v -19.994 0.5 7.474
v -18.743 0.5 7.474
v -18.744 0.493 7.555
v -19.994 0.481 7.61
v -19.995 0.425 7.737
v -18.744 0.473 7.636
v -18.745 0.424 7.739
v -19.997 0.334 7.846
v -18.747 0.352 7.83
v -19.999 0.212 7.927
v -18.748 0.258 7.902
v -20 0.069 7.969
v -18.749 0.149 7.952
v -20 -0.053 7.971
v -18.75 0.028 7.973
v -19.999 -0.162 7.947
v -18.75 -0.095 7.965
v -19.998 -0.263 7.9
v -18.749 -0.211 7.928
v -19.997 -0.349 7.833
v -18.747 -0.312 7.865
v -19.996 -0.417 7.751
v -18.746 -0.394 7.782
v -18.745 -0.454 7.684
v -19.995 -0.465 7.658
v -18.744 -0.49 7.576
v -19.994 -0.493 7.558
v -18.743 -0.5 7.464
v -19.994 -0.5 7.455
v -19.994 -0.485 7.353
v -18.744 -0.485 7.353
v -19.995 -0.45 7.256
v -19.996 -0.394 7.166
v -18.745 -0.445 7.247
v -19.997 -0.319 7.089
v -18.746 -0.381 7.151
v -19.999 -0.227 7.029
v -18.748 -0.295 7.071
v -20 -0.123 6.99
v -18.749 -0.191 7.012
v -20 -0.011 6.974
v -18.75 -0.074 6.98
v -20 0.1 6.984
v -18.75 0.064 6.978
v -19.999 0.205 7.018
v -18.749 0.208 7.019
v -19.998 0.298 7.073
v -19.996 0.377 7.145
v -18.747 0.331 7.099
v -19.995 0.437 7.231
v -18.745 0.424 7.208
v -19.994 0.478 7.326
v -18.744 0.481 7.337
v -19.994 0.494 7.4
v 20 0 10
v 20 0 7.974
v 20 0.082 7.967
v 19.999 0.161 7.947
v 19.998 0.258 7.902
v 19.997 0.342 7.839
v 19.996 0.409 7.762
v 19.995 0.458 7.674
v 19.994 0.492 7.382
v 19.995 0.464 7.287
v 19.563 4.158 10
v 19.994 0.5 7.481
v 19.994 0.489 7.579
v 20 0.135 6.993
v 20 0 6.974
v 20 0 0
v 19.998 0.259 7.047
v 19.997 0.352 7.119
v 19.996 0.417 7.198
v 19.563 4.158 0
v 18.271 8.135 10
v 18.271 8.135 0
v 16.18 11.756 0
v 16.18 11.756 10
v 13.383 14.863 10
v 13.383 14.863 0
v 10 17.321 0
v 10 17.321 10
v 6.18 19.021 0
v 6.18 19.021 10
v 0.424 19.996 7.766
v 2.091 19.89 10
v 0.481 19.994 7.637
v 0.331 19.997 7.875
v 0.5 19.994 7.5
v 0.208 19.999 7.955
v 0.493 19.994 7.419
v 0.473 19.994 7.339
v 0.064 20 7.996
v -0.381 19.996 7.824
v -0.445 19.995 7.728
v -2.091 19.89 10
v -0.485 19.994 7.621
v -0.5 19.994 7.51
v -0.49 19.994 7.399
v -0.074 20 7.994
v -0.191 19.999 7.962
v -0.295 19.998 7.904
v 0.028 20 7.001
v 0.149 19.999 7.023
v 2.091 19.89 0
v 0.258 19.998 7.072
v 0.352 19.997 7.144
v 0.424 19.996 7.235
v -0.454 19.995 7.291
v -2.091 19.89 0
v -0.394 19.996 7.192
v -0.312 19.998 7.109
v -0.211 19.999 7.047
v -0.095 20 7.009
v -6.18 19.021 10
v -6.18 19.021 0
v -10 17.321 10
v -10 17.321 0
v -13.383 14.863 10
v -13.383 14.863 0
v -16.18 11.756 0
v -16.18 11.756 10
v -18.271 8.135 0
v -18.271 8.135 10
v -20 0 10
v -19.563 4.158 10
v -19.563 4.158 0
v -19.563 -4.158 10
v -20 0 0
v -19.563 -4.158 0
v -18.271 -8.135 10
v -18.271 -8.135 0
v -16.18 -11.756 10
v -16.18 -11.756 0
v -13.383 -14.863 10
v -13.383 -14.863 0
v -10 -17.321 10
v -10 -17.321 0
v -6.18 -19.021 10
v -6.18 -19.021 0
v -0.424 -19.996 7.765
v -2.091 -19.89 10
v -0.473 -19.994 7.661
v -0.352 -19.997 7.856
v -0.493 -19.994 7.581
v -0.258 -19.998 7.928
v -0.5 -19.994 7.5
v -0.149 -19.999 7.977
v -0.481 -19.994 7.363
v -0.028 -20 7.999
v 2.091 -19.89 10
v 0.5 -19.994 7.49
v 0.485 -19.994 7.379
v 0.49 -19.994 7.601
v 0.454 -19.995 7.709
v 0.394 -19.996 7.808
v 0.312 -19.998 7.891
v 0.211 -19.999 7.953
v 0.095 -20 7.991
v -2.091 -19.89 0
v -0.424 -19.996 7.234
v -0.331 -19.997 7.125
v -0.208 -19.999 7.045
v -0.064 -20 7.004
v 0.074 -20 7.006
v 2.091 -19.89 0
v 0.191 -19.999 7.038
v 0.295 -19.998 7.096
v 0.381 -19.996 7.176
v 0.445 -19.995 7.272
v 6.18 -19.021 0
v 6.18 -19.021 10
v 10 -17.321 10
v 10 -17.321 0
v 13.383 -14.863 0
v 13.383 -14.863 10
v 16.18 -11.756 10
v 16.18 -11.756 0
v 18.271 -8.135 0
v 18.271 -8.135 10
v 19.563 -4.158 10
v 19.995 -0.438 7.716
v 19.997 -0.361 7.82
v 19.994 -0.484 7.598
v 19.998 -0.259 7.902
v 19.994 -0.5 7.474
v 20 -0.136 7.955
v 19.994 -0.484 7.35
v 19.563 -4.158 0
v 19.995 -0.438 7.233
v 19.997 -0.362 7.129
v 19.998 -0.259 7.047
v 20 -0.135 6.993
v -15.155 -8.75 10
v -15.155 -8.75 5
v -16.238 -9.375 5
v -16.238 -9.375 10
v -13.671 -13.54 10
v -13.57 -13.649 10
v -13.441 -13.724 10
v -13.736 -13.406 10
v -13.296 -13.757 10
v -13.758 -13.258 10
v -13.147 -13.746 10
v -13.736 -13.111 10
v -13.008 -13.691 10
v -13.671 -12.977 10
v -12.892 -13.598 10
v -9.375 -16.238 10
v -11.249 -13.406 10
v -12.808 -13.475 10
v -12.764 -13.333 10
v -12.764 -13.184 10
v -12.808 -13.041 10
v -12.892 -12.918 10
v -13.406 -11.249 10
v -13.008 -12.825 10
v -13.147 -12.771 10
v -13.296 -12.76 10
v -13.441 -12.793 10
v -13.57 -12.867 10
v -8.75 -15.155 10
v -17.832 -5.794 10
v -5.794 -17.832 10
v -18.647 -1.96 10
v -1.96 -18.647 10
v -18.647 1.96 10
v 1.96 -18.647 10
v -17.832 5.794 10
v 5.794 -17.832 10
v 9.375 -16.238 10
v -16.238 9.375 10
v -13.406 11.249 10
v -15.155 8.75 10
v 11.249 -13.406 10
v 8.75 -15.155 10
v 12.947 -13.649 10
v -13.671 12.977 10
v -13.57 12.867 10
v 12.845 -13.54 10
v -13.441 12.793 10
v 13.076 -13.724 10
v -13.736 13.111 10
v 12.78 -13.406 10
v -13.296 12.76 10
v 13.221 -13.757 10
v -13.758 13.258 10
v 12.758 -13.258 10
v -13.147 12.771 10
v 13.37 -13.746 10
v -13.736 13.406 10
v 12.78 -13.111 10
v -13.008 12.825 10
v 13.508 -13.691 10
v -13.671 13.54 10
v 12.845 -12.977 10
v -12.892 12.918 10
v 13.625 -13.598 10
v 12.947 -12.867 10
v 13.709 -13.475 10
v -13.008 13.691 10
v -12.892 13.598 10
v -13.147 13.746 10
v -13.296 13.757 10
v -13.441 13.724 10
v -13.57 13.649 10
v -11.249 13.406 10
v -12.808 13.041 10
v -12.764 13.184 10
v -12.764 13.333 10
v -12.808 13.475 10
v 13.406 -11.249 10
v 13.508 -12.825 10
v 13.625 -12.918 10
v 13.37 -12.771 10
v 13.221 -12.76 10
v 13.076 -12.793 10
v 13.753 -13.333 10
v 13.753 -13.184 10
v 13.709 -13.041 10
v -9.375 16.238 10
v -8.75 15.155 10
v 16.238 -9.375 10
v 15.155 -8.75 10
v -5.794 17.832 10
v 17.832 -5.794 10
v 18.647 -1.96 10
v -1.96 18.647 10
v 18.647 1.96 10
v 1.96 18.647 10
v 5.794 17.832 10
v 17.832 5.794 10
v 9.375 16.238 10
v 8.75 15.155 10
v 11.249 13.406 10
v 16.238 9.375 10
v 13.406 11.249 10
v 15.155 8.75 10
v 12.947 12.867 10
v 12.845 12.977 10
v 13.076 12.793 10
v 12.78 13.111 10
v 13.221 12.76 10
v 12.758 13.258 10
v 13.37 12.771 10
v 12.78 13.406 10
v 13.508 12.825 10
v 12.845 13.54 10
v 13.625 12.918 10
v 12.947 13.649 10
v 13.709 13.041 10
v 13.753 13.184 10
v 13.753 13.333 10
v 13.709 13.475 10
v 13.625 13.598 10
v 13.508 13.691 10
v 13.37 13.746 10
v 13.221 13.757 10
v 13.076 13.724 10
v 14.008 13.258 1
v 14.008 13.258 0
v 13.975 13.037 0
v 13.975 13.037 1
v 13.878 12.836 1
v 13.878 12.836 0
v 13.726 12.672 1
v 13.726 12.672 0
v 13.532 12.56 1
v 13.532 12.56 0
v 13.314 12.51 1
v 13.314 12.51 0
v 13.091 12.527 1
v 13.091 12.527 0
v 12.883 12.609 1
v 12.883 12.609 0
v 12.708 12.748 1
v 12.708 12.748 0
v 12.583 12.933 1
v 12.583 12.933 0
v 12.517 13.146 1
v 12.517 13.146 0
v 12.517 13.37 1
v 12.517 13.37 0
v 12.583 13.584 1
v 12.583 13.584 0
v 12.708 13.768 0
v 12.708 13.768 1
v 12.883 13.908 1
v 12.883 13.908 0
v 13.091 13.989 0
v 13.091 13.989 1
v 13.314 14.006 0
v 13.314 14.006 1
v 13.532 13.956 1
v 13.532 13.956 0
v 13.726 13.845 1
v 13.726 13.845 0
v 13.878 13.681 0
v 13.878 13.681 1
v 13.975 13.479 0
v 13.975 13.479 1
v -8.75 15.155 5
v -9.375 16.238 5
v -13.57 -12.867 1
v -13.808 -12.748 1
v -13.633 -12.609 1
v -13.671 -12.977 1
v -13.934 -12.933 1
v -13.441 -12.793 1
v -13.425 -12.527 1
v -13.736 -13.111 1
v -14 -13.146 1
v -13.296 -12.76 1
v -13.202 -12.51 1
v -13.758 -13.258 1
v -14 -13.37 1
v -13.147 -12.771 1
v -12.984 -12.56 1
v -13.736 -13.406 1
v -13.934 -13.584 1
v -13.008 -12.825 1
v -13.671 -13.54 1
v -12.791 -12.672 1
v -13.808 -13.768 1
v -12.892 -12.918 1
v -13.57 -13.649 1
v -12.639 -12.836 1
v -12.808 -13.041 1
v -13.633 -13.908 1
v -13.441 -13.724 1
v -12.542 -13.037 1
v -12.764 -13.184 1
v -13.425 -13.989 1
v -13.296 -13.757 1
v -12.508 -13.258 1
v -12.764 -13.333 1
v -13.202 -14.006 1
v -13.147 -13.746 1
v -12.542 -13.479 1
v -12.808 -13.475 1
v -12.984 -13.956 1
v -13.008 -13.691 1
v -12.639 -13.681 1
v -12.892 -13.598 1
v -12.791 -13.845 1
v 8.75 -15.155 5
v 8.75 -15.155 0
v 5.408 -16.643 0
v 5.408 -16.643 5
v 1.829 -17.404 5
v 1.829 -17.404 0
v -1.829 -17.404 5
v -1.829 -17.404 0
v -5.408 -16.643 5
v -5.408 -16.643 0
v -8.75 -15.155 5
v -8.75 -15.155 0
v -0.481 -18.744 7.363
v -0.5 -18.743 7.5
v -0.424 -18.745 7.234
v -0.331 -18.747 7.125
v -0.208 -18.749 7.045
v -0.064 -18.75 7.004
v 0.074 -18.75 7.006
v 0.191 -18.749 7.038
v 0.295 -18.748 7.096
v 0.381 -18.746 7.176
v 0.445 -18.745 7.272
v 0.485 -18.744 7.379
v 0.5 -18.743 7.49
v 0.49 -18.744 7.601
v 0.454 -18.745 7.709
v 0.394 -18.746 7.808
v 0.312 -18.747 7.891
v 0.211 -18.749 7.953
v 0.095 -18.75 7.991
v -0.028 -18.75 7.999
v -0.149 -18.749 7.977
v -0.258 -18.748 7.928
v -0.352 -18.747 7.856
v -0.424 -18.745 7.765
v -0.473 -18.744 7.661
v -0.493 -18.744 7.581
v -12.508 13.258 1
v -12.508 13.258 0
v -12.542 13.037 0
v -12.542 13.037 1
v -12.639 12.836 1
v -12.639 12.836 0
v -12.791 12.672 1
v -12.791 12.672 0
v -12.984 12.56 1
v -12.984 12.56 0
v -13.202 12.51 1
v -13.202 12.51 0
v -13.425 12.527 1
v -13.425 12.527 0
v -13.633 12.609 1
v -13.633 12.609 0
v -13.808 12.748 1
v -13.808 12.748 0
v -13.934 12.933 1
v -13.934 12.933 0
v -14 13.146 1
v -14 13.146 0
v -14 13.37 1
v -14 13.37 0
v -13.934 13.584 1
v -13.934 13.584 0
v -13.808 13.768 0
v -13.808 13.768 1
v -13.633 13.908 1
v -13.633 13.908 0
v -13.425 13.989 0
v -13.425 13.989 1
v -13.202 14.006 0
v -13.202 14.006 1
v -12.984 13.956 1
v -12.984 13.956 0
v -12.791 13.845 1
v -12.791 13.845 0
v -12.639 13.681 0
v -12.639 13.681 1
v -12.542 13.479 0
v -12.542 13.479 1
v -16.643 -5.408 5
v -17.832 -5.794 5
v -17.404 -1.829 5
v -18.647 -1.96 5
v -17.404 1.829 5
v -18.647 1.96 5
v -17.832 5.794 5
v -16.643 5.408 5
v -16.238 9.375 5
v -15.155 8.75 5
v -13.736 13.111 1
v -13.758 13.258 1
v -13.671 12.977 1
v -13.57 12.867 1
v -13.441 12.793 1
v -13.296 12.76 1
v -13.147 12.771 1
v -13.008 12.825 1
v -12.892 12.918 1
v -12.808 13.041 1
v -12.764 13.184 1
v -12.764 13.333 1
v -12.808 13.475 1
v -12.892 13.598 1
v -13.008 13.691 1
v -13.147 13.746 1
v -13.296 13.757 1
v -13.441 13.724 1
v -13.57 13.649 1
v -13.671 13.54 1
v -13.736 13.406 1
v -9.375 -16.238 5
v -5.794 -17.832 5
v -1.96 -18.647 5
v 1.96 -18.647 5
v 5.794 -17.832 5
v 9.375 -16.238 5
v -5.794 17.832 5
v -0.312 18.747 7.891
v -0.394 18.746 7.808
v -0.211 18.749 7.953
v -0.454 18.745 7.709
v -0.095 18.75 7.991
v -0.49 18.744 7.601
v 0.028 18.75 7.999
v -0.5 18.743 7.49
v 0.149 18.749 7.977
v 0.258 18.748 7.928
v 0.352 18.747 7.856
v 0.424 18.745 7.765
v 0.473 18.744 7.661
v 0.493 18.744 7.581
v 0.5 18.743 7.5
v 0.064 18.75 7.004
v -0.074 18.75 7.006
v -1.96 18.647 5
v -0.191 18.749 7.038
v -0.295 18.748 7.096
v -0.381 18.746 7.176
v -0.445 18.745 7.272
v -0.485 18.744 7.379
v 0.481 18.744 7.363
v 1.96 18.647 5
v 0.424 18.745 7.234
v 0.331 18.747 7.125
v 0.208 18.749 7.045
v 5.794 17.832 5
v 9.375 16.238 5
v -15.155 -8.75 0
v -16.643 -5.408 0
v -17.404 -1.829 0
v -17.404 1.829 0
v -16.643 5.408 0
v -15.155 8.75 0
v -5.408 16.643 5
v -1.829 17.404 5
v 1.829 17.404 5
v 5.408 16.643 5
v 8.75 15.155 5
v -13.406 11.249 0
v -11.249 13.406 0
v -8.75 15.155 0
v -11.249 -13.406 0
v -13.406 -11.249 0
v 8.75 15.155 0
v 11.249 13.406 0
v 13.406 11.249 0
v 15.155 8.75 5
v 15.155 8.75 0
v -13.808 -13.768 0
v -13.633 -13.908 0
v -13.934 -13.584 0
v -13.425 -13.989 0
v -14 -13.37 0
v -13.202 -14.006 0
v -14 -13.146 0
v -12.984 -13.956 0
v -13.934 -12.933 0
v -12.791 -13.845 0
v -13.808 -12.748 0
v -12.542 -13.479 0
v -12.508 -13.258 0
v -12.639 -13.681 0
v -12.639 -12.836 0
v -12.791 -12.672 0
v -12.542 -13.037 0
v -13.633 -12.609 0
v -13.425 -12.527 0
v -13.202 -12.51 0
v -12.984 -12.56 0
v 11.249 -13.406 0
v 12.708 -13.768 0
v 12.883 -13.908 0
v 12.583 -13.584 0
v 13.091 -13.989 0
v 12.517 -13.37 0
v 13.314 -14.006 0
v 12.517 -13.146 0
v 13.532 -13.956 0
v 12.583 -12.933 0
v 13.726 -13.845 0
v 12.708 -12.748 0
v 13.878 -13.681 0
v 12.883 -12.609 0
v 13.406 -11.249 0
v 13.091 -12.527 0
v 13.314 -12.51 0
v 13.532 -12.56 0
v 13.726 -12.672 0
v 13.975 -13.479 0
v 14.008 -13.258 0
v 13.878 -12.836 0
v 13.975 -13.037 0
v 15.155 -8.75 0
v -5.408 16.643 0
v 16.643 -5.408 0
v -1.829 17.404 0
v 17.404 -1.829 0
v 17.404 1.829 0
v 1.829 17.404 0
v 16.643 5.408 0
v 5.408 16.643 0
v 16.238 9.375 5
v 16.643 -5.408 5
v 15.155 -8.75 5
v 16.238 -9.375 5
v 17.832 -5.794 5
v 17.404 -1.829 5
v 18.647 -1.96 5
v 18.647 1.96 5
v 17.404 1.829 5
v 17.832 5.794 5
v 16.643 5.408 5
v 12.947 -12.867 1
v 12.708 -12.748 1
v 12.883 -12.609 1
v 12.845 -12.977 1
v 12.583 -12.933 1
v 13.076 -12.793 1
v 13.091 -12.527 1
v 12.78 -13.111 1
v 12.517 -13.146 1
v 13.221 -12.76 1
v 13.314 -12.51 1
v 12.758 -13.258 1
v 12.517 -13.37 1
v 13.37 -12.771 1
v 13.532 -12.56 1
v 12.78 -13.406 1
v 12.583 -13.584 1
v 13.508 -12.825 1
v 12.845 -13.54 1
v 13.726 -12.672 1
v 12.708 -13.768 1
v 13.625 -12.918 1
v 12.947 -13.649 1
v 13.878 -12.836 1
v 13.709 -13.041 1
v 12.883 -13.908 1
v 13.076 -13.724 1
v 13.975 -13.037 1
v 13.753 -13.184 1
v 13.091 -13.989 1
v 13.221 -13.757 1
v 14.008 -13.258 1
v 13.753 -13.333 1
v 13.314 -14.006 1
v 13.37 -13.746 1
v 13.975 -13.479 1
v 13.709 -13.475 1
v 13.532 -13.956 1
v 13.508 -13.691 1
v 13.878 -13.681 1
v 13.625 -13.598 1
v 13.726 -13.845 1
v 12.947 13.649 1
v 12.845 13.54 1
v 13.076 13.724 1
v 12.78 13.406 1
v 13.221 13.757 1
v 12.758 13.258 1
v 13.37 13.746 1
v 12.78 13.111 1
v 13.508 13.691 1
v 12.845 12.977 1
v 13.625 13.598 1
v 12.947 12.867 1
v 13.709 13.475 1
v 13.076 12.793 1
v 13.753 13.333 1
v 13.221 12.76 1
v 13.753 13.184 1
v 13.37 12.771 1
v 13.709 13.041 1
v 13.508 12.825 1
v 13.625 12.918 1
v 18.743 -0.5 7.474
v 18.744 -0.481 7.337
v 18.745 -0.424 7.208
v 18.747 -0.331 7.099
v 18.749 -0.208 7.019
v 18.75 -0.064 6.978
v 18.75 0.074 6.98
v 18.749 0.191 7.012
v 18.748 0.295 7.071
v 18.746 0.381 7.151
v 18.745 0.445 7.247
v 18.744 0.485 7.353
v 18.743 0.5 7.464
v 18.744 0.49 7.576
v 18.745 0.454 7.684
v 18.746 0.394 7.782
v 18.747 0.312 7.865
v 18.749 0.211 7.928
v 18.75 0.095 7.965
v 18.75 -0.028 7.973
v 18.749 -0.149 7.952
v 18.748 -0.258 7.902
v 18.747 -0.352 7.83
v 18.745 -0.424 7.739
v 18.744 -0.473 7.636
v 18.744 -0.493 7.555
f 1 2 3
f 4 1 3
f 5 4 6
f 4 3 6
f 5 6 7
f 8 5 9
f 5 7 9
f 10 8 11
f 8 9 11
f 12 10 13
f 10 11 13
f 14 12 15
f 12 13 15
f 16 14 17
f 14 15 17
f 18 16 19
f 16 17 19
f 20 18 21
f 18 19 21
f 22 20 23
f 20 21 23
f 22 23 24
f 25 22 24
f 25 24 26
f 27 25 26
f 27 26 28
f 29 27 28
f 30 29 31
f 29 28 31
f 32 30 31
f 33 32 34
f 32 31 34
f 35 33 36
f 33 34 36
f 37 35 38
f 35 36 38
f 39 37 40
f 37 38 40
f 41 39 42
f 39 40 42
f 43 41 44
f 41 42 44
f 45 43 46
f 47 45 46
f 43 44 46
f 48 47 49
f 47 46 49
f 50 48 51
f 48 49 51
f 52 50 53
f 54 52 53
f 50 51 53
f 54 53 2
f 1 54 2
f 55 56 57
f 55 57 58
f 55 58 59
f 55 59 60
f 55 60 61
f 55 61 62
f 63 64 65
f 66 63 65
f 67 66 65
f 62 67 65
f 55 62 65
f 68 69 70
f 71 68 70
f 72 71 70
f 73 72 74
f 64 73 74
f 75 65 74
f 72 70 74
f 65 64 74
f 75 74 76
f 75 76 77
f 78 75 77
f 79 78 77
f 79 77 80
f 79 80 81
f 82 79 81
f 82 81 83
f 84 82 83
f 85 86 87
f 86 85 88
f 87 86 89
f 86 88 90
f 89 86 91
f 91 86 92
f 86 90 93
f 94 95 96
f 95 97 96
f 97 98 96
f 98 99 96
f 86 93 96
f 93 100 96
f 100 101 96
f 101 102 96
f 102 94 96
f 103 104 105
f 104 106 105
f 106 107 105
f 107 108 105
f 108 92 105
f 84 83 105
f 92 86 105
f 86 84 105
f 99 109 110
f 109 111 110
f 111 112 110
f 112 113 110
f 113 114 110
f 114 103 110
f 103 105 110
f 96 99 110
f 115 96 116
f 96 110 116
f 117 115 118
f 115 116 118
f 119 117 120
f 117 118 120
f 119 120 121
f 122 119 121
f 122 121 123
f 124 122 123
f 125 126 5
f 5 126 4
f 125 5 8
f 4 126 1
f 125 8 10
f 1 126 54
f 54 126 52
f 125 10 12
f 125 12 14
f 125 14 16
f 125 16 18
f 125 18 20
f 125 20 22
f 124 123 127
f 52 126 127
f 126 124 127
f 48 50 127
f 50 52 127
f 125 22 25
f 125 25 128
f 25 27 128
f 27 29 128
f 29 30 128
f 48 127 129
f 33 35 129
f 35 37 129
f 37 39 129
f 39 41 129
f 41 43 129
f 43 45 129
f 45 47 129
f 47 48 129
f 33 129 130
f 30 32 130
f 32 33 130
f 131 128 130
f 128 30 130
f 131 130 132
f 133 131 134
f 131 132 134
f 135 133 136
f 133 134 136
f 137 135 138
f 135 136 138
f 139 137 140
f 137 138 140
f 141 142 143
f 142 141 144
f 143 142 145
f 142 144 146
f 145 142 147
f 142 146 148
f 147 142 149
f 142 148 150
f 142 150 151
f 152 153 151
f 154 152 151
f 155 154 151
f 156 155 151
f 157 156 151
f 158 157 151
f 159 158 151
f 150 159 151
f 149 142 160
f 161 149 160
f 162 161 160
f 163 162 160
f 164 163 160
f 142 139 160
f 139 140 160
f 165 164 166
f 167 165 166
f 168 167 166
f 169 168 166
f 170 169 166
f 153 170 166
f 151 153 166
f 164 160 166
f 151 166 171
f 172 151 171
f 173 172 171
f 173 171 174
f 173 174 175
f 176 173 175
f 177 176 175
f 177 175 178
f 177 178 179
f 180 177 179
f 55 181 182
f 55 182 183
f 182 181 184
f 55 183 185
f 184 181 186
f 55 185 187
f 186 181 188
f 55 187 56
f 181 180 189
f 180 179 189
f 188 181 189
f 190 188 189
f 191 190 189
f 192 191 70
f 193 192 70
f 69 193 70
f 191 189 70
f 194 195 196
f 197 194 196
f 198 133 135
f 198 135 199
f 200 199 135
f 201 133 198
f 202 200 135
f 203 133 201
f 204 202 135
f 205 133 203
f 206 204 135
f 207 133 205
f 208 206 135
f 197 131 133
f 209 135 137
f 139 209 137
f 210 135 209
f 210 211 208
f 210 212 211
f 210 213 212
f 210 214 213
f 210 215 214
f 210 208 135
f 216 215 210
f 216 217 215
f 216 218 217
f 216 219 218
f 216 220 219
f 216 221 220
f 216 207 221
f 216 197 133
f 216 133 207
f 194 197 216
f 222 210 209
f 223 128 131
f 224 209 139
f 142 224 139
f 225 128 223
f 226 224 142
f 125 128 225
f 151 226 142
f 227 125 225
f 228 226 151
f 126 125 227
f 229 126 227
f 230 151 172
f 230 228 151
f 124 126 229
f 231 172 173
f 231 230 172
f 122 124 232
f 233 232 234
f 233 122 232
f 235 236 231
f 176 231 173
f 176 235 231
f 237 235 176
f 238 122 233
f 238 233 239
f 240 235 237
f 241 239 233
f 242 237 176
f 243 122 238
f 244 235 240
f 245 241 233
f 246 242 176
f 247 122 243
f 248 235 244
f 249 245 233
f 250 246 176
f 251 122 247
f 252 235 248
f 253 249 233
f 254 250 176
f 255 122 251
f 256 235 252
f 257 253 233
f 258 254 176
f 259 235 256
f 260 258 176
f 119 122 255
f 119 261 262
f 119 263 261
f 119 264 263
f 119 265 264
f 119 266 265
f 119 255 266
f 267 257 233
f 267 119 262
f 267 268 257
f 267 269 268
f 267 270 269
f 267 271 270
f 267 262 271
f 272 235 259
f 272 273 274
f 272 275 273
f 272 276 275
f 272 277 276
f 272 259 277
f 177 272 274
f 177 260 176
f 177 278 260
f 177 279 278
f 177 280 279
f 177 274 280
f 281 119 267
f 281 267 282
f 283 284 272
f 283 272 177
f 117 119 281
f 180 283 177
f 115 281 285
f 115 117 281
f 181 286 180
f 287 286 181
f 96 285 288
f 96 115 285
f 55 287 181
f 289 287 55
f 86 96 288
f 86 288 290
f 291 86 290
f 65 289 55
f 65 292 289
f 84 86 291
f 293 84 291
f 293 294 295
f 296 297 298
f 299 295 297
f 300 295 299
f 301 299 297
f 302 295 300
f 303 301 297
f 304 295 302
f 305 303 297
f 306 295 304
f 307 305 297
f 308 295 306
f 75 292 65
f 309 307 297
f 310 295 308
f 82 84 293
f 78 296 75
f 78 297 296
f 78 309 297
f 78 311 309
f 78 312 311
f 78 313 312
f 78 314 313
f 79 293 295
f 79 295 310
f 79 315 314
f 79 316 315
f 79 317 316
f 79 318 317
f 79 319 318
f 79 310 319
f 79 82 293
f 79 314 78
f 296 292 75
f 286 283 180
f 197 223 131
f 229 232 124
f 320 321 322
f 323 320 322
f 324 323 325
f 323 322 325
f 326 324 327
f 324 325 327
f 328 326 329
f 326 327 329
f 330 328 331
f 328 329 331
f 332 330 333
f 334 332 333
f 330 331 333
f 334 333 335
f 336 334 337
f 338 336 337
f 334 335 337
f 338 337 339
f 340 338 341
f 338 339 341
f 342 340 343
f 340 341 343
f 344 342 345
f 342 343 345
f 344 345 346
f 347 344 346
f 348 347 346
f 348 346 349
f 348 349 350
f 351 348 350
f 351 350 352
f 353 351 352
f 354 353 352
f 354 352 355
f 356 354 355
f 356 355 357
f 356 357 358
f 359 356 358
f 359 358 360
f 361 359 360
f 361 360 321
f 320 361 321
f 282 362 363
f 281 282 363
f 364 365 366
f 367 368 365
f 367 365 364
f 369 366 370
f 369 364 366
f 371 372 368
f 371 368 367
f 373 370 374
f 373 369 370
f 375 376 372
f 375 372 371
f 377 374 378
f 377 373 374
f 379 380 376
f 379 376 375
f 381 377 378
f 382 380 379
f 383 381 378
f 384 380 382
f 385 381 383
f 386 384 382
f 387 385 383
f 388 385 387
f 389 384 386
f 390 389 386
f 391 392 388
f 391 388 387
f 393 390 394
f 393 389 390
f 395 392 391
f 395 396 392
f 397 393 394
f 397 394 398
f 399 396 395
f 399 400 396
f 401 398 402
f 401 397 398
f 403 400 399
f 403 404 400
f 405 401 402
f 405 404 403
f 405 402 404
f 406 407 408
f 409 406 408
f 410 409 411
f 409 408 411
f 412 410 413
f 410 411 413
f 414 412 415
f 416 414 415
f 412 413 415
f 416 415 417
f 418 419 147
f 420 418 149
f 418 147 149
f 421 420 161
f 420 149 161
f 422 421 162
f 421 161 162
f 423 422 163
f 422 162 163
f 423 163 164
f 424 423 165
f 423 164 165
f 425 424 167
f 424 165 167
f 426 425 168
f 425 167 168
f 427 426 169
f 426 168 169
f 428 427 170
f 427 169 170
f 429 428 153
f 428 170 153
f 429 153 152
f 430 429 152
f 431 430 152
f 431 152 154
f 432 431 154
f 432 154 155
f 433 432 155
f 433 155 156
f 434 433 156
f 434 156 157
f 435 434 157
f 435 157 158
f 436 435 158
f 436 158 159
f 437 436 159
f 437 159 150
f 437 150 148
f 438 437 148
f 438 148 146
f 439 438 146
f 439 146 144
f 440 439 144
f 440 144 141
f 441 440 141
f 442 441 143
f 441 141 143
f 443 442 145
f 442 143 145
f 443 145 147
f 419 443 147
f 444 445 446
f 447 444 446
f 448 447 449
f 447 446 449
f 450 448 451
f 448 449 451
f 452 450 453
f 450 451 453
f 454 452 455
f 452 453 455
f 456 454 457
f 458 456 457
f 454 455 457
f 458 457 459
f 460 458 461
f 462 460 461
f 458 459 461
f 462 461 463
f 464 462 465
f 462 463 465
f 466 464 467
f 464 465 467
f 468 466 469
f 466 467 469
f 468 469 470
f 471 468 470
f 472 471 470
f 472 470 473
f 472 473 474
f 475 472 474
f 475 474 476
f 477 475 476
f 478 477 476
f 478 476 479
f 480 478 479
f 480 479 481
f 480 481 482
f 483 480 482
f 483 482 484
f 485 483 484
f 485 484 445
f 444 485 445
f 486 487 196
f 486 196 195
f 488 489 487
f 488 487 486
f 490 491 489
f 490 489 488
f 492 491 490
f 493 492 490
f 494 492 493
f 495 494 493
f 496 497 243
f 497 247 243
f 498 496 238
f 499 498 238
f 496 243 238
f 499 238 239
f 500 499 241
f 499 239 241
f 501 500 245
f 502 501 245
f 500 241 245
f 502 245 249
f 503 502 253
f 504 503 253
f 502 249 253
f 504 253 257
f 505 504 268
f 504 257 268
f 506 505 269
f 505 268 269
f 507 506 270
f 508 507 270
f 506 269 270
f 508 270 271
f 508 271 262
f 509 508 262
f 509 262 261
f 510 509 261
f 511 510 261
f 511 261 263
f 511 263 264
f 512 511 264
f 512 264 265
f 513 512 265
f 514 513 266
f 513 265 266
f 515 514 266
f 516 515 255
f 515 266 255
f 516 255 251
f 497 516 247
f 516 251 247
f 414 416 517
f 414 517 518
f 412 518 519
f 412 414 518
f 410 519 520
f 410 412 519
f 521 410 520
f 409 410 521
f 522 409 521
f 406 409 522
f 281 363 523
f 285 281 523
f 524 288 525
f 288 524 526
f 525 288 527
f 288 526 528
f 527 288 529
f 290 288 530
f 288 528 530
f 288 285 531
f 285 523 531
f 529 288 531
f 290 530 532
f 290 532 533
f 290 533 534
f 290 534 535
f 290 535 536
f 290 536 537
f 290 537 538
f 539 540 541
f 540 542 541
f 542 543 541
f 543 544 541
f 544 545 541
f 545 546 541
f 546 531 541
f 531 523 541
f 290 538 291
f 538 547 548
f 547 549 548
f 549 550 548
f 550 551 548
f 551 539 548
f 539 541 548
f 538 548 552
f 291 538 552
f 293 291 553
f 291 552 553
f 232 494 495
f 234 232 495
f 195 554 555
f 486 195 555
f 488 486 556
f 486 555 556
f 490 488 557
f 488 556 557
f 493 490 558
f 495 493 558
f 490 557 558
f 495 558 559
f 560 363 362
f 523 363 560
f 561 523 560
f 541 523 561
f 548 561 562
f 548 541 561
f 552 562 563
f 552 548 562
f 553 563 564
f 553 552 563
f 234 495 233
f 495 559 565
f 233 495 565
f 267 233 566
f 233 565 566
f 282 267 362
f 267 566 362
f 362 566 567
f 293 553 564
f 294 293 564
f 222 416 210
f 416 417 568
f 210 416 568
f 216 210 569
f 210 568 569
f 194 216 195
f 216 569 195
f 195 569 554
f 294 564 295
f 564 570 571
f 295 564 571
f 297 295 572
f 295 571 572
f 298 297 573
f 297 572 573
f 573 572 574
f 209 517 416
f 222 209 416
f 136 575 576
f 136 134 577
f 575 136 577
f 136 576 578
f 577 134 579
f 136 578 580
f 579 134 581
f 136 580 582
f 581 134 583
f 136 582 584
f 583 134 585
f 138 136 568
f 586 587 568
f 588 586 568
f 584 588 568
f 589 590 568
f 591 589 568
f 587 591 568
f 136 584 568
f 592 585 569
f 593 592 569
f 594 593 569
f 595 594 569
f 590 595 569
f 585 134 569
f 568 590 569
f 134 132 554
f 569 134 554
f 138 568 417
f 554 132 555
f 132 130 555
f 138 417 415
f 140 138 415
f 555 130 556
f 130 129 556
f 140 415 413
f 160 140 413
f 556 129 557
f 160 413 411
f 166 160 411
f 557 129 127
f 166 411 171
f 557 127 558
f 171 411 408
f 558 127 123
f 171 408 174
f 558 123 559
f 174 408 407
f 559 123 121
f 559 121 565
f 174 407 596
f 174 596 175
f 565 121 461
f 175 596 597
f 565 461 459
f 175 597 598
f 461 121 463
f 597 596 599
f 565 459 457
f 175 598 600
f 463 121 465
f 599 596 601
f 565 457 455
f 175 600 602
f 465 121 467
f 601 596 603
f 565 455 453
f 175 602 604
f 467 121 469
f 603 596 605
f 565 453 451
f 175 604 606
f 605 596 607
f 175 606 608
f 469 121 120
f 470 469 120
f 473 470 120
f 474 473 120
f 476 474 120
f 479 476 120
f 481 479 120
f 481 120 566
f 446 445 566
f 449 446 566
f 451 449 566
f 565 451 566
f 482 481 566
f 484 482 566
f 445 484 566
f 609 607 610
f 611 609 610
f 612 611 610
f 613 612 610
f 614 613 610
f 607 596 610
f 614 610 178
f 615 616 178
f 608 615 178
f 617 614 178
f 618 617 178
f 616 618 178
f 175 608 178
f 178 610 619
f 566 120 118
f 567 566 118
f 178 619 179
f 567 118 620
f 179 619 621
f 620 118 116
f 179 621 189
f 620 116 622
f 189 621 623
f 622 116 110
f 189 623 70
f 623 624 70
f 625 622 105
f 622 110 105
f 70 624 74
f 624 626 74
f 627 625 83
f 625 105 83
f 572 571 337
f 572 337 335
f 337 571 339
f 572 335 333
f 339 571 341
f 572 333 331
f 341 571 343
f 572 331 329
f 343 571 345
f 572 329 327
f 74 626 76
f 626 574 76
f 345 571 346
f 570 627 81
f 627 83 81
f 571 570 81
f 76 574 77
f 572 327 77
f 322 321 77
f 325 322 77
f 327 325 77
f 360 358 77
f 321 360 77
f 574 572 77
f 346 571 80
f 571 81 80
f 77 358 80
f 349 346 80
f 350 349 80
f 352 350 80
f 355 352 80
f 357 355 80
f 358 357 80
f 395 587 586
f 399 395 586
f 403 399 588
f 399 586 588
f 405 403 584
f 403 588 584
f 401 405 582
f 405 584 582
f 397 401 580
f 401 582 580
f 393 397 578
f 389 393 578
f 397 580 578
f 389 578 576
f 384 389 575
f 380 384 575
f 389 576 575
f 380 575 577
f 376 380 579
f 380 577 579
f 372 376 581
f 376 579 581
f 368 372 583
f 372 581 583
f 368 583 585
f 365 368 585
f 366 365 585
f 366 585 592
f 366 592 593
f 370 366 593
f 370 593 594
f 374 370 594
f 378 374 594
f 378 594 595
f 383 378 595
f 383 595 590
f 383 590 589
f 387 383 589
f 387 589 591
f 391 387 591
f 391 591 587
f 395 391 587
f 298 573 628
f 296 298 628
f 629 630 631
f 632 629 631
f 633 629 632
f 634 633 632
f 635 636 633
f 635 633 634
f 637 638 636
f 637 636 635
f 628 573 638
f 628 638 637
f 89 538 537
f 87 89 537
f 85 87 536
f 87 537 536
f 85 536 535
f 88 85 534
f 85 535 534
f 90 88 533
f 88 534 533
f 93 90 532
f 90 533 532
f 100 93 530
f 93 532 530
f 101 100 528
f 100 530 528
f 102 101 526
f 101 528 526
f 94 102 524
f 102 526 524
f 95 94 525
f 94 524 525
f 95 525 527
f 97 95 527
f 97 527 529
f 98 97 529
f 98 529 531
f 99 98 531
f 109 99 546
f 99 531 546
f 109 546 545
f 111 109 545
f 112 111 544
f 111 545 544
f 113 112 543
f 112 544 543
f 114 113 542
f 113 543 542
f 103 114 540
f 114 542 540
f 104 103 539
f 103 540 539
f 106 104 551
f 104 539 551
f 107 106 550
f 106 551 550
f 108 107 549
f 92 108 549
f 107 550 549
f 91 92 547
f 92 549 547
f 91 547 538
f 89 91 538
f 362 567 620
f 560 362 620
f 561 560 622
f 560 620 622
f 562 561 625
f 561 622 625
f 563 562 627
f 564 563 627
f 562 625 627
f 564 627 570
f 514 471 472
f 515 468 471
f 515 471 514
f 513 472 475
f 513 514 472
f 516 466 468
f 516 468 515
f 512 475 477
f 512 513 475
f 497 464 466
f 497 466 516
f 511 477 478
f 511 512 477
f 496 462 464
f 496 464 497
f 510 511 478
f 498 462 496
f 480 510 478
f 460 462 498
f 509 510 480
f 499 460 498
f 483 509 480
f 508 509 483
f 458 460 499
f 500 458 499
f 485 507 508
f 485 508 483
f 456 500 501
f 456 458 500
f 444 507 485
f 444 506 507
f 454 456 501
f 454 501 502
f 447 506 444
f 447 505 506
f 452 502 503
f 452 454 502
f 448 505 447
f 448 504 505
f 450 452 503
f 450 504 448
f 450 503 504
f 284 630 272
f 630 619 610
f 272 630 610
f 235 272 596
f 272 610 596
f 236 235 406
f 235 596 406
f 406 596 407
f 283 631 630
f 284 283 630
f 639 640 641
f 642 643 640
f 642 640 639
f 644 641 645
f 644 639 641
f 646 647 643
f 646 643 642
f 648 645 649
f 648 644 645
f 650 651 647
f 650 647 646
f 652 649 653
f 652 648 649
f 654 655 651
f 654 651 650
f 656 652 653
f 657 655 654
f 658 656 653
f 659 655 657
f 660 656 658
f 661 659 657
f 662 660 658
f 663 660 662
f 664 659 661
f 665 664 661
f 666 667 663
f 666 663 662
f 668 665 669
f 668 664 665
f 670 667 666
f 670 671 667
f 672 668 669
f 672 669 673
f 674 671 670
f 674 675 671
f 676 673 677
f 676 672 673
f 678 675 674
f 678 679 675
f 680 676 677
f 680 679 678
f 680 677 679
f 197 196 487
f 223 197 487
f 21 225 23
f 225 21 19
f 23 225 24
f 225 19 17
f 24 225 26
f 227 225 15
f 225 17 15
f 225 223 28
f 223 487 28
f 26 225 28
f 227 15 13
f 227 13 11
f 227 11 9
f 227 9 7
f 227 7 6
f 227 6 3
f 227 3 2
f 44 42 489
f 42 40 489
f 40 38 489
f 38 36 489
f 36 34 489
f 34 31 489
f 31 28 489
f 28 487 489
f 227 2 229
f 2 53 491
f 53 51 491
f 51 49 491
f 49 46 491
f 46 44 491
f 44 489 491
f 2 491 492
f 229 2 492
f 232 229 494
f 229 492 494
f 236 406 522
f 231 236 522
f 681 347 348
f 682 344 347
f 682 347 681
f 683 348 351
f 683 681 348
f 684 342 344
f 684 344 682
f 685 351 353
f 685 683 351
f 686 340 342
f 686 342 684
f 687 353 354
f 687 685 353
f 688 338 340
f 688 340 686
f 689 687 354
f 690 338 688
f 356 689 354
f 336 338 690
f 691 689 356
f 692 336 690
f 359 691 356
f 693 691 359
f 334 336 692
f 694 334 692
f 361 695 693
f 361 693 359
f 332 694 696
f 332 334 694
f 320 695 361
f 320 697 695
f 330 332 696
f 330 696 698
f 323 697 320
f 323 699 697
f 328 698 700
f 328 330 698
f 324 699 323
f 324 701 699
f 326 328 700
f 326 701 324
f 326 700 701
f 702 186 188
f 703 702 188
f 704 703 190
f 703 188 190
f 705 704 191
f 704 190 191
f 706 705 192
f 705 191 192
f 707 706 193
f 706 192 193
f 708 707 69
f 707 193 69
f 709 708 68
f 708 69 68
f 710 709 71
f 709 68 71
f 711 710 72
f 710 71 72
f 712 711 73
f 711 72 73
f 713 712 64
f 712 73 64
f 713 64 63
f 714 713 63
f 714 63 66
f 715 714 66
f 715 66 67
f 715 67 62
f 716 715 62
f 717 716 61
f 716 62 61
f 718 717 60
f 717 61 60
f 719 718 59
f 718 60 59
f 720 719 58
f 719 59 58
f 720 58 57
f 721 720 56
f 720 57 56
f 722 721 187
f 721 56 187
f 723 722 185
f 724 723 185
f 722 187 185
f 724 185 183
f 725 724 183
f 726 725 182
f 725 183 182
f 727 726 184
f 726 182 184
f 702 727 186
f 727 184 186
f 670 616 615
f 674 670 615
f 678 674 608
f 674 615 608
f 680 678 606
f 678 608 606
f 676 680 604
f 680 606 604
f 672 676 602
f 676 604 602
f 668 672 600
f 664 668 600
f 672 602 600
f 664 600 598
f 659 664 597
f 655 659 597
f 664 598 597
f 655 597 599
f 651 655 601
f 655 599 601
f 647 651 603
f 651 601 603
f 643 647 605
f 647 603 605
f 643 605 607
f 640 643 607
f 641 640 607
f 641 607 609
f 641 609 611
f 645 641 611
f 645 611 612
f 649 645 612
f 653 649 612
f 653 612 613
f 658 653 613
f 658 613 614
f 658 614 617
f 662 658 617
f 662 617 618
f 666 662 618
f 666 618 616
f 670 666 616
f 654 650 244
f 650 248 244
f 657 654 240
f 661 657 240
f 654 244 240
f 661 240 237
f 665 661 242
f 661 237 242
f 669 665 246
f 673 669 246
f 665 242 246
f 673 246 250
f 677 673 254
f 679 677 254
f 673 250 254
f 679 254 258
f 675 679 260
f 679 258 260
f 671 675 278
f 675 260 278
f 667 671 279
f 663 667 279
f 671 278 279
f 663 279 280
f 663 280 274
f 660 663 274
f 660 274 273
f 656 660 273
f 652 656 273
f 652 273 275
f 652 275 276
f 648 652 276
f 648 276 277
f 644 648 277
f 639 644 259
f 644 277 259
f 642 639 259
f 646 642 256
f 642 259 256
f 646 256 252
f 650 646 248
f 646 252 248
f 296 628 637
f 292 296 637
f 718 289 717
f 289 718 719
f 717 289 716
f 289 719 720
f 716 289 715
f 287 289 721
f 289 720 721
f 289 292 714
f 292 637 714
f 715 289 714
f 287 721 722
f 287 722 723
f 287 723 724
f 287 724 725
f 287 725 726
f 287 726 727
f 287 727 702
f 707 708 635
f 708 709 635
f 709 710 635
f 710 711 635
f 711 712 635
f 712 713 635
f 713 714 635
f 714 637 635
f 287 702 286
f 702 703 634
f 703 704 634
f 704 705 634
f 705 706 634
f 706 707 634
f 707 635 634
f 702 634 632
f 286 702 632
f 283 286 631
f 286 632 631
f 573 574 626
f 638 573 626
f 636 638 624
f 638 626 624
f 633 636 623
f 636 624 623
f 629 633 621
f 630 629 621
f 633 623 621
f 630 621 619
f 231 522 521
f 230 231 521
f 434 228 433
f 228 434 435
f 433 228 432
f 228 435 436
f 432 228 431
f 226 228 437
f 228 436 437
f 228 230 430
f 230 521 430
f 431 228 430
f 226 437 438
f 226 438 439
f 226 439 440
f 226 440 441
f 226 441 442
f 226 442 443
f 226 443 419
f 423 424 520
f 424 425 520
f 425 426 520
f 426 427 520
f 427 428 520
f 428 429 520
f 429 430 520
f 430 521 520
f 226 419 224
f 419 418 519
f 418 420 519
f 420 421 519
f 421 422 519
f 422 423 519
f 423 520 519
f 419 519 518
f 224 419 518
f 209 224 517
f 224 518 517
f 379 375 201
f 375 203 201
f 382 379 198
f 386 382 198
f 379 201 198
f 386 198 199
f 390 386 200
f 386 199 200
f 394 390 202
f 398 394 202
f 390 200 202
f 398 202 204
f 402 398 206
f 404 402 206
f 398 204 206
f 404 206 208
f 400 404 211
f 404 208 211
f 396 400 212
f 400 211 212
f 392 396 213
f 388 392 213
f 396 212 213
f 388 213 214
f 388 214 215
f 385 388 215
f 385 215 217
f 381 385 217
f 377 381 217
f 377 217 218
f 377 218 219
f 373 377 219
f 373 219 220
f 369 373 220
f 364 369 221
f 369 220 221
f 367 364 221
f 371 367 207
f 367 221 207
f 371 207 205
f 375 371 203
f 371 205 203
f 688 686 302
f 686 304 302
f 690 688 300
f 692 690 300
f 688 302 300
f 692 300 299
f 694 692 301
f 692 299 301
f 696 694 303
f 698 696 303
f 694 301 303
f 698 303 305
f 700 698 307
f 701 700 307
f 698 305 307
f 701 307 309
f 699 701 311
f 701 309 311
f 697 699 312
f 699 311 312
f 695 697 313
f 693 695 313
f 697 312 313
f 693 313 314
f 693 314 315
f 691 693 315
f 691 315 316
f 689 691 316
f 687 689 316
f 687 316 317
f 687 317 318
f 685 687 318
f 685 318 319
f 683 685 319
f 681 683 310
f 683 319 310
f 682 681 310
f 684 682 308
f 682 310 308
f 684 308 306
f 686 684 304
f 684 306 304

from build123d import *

# Parameters (mm, degrees)
F0_R            = 20
F1_DEPTH        = 10
F2_DEPTH        = 5
F3_DEPTH        = 5
F4_DEPTH        = 5
F5_DEPTH        = 5
F6_DEPTH        = 10
F7_DEPTH        = 10
F8_DEPTH        = 10
F9_DEPTH        = 10
F12_D           = 1
F12_DEPTH       = 20.001
F13_D           = 1
F13_DEPTH       = 20.0010001
F14_D           = 1
F15_D           = 1
F16_D           = 1
F16_CBORE_D     = 1.5
F16_CBORE_DEPTH = 1
F17_D           = 1
F17_CBORE_D     = 1.5
F17_CBORE_DEPTH = 1
F18_D           = 1
F18_CBORE_D     = 1.5
F18_CBORE_DEPTH = 1
F19_D           = 1
F19_CBORE_D     = 1.5
F19_CBORE_DEPTH = 1


with BuildPart() as f1:
    # F0 (on Top) → F1 (new body)
    with BuildSketch(Plane.XY):
        Circle(F0_R)
        with BuildLine():
            ThreePointArc((-16.237976321, -9.375), (-18.75, 0), (-16.237976321, 9.375))
            ThreePointArc((-16.237976321, 9.375), (-13.2582521472, 13.2582521472), (-9.375, 16.237976321))
            ThreePointArc((-9.375, 16.237976321), (0, 18.75), (9.375, 16.237976321))
            ThreePointArc((9.375, 16.237976321), (13.2582521472, 13.2582521472), (16.237976321, 9.375))
            ThreePointArc((16.237976321, 9.375), (18.75, 0), (16.237976321, -9.375))
            ThreePointArc((16.237976321, -9.375), (13.2582521472, -13.2582521472), (9.375, -16.237976321))
            ThreePointArc((9.375, -16.237976321), (0, -18.75), (-9.375, -16.237976321))
            ThreePointArc((-9.375, -16.237976321), (-13.2582521472, -13.2582521472), (-16.237976321, -9.375))
        make_face(mode=Mode.SUBTRACT)
    extrude(amount=F1_DEPTH)

    # F0 (on Top) → F2 (join)
    with BuildSketch(Plane.XY):
        with BuildLine():
            ThreePointArc((-15.1554445662, -8.75), (-17.5, 0), (-15.1554445662, 8.75))
            Line((-15.1554445662, 8.75), (-16.237976321, 9.375))
            ThreePointArc((-16.237976321, 9.375), (-18.75, 0), (-16.237976321, -9.375))
            Line((-16.237976321, -9.375), (-15.1554445662, -8.75))
        make_face()
    extrude(amount=F2_DEPTH)

    # F0 (on Top) → F3 (join)
    with BuildSketch(Plane.XY):
        with BuildLine():
            Line((-9.375, 16.237976321), (-8.75, 15.1554445662))
            ThreePointArc((-8.75, 15.1554445662), (0, 17.5), (8.75, 15.1554445662))
            Line((8.75, 15.1554445662), (9.375, 16.237976321))
            ThreePointArc((9.375, 16.237976321), (0, 18.75), (-9.375, 16.237976321))
        make_face()
    extrude(amount=F3_DEPTH)

    # F0 (on Top) → F4 (join)
    with BuildSketch(Plane.XY):
        with BuildLine():
            ThreePointArc((8.75, -15.1554445662), (0, -17.5), (-8.75, -15.1554445662))
            Line((-8.75, -15.1554445662), (-9.375, -16.237976321))
            ThreePointArc((-9.375, -16.237976321), (0, -18.75), (9.375, -16.237976321))
            Line((9.375, -16.237976321), (8.75, -15.1554445662))
        make_face()
    extrude(amount=F4_DEPTH)

    # F0 (on Top) → F5 (join)
    with BuildSketch(Plane.XY):
        with BuildLine():
            Line((16.237976321, 9.375), (15.1554445662, 8.75))
            ThreePointArc((15.1554445662, 8.75), (17.5, 0), (15.1554445662, -8.75))
            Line((15.1554445662, -8.75), (16.237976321, -9.375))
            ThreePointArc((16.237976321, -9.375), (18.75, 0), (16.237976321, 9.375))
        make_face()
    extrude(amount=F5_DEPTH)

    # F0 (on Top) → F6 (join)
    with BuildSketch(Plane.XY):
        with BuildLine():
            Line((-16.237976321, 9.375), (-15.1554445662, 8.75))
            ThreePointArc((-15.1554445662, 8.75), (-12.3743686708, 12.3743686708), (-8.75, 15.1554445662))
            Line((-8.75, 15.1554445662), (-9.375, 16.237976321))
            ThreePointArc((-9.375, 16.237976321), (-13.2582521472, 13.2582521472), (-16.237976321, 9.375))
        make_face()
    extrude(amount=F6_DEPTH)

    # F0 (on Top) → F7 (join)
    with BuildSketch(Plane.XY):
        with BuildLine():
            ThreePointArc((-8.75, -15.1554445662), (-12.3743686708, -12.3743686708), (-15.1554445662, -8.75))
            Line((-15.1554445662, -8.75), (-16.237976321, -9.375))
            ThreePointArc((-16.237976321, -9.375), (-13.2582521472, -13.2582521472), (-9.375, -16.237976321))
            Line((-9.375, -16.237976321), (-8.75, -15.1554445662))
        make_face()
    extrude(amount=F7_DEPTH)

    # F0 (on Top) → F8 (join)
    with BuildSketch(Plane.XY):
        with BuildLine():
            ThreePointArc((15.1554445662, -8.75), (12.3743686708, -12.3743686708), (8.75, -15.1554445662))
            Line((8.75, -15.1554445662), (9.375, -16.237976321))
            ThreePointArc((9.375, -16.237976321), (13.2582521472, -13.2582521472), (16.237976321, -9.375))
            Line((16.237976321, -9.375), (15.1554445662, -8.75))
        make_face()
    extrude(amount=F8_DEPTH)

    # F0 (on Top) → F9 (join)
    with BuildSketch(Plane.XY):
        with BuildLine():
            Line((9.375, 16.237976321), (8.75, 15.1554445662))
            ThreePointArc((8.75, 15.1554445662), (12.3743686708, 12.3743686708), (15.1554445662, 8.75))
            Line((15.1554445662, 8.75), (16.237976321, 9.375))
            ThreePointArc((16.237976321, 9.375), (13.2582521472, 13.2582521472), (9.375, 16.237976321))
        make_face()
    extrude(amount=F9_DEPTH)

    # F12 (through all, one way)
    with BuildSketch(Plane.YZ):
        with Locations((0, 7.4741876426)):
            Circle(F12_D / 2)
    extrude(amount=-F12_DEPTH, mode=Mode.SUBTRACT)

    # F13 (through all, one way)
    with BuildSketch(Plane.XZ):
        with Locations((0, 7.5)):
            Circle(F13_D / 2)
    extrude(amount=-F13_DEPTH, mode=Mode.SUBTRACT)

    # F14 (through all)
    with Locations(Plane(origin=(0, 0, 0), x_dir=(1, 0, 0), z_dir=(0, 1, 0))):
        with Locations((0, -7.5)):
            Hole(F14_D / 2)

    # F15 (through all)
    with Locations(Plane(origin=(0, 0, 0), x_dir=(0, 1, 0), z_dir=(-1, 0, 0))):
        with Locations((0, -7.4741876426)):
            Hole(F15_D / 2)

    # F16 (through all)
    with Locations(Plane(origin=(0, 0, 0), x_dir=(1, 0, 0), z_dir=(0, 0, -1))):
        with Locations((-13.2582521472, 13.2582521472)):
            CounterBoreHole(F16_D / 2, F16_CBORE_D / 2, F16_CBORE_DEPTH)

    # F17 (through all)
    with Locations(Plane(origin=(0, 0, 0), x_dir=(1, 0, 0), z_dir=(0, 0, -1))):
        with Locations((13.2582521472, 13.2582521472)):
            CounterBoreHole(F17_D / 2, F17_CBORE_D / 2, F17_CBORE_DEPTH)

    # F18 (through all)
    with Locations(Plane(origin=(0, 0, 0), x_dir=(1, 0, 0), z_dir=(0, 0, -1))):
        with Locations((13.2582521472, -13.2582521472)):
            CounterBoreHole(F18_D / 2, F18_CBORE_D / 2, F18_CBORE_DEPTH)

    # F19 (through all)
    with Locations(Plane(origin=(0, 0, 0), x_dir=(1, 0, 0), z_dir=(0, 0, -1))):
        with Locations((-13.2582521472, -13.2582521472)):
            CounterBoreHole(F19_D / 2, F19_CBORE_D / 2, F19_CBORE_DEPTH)


solid = f1.part
